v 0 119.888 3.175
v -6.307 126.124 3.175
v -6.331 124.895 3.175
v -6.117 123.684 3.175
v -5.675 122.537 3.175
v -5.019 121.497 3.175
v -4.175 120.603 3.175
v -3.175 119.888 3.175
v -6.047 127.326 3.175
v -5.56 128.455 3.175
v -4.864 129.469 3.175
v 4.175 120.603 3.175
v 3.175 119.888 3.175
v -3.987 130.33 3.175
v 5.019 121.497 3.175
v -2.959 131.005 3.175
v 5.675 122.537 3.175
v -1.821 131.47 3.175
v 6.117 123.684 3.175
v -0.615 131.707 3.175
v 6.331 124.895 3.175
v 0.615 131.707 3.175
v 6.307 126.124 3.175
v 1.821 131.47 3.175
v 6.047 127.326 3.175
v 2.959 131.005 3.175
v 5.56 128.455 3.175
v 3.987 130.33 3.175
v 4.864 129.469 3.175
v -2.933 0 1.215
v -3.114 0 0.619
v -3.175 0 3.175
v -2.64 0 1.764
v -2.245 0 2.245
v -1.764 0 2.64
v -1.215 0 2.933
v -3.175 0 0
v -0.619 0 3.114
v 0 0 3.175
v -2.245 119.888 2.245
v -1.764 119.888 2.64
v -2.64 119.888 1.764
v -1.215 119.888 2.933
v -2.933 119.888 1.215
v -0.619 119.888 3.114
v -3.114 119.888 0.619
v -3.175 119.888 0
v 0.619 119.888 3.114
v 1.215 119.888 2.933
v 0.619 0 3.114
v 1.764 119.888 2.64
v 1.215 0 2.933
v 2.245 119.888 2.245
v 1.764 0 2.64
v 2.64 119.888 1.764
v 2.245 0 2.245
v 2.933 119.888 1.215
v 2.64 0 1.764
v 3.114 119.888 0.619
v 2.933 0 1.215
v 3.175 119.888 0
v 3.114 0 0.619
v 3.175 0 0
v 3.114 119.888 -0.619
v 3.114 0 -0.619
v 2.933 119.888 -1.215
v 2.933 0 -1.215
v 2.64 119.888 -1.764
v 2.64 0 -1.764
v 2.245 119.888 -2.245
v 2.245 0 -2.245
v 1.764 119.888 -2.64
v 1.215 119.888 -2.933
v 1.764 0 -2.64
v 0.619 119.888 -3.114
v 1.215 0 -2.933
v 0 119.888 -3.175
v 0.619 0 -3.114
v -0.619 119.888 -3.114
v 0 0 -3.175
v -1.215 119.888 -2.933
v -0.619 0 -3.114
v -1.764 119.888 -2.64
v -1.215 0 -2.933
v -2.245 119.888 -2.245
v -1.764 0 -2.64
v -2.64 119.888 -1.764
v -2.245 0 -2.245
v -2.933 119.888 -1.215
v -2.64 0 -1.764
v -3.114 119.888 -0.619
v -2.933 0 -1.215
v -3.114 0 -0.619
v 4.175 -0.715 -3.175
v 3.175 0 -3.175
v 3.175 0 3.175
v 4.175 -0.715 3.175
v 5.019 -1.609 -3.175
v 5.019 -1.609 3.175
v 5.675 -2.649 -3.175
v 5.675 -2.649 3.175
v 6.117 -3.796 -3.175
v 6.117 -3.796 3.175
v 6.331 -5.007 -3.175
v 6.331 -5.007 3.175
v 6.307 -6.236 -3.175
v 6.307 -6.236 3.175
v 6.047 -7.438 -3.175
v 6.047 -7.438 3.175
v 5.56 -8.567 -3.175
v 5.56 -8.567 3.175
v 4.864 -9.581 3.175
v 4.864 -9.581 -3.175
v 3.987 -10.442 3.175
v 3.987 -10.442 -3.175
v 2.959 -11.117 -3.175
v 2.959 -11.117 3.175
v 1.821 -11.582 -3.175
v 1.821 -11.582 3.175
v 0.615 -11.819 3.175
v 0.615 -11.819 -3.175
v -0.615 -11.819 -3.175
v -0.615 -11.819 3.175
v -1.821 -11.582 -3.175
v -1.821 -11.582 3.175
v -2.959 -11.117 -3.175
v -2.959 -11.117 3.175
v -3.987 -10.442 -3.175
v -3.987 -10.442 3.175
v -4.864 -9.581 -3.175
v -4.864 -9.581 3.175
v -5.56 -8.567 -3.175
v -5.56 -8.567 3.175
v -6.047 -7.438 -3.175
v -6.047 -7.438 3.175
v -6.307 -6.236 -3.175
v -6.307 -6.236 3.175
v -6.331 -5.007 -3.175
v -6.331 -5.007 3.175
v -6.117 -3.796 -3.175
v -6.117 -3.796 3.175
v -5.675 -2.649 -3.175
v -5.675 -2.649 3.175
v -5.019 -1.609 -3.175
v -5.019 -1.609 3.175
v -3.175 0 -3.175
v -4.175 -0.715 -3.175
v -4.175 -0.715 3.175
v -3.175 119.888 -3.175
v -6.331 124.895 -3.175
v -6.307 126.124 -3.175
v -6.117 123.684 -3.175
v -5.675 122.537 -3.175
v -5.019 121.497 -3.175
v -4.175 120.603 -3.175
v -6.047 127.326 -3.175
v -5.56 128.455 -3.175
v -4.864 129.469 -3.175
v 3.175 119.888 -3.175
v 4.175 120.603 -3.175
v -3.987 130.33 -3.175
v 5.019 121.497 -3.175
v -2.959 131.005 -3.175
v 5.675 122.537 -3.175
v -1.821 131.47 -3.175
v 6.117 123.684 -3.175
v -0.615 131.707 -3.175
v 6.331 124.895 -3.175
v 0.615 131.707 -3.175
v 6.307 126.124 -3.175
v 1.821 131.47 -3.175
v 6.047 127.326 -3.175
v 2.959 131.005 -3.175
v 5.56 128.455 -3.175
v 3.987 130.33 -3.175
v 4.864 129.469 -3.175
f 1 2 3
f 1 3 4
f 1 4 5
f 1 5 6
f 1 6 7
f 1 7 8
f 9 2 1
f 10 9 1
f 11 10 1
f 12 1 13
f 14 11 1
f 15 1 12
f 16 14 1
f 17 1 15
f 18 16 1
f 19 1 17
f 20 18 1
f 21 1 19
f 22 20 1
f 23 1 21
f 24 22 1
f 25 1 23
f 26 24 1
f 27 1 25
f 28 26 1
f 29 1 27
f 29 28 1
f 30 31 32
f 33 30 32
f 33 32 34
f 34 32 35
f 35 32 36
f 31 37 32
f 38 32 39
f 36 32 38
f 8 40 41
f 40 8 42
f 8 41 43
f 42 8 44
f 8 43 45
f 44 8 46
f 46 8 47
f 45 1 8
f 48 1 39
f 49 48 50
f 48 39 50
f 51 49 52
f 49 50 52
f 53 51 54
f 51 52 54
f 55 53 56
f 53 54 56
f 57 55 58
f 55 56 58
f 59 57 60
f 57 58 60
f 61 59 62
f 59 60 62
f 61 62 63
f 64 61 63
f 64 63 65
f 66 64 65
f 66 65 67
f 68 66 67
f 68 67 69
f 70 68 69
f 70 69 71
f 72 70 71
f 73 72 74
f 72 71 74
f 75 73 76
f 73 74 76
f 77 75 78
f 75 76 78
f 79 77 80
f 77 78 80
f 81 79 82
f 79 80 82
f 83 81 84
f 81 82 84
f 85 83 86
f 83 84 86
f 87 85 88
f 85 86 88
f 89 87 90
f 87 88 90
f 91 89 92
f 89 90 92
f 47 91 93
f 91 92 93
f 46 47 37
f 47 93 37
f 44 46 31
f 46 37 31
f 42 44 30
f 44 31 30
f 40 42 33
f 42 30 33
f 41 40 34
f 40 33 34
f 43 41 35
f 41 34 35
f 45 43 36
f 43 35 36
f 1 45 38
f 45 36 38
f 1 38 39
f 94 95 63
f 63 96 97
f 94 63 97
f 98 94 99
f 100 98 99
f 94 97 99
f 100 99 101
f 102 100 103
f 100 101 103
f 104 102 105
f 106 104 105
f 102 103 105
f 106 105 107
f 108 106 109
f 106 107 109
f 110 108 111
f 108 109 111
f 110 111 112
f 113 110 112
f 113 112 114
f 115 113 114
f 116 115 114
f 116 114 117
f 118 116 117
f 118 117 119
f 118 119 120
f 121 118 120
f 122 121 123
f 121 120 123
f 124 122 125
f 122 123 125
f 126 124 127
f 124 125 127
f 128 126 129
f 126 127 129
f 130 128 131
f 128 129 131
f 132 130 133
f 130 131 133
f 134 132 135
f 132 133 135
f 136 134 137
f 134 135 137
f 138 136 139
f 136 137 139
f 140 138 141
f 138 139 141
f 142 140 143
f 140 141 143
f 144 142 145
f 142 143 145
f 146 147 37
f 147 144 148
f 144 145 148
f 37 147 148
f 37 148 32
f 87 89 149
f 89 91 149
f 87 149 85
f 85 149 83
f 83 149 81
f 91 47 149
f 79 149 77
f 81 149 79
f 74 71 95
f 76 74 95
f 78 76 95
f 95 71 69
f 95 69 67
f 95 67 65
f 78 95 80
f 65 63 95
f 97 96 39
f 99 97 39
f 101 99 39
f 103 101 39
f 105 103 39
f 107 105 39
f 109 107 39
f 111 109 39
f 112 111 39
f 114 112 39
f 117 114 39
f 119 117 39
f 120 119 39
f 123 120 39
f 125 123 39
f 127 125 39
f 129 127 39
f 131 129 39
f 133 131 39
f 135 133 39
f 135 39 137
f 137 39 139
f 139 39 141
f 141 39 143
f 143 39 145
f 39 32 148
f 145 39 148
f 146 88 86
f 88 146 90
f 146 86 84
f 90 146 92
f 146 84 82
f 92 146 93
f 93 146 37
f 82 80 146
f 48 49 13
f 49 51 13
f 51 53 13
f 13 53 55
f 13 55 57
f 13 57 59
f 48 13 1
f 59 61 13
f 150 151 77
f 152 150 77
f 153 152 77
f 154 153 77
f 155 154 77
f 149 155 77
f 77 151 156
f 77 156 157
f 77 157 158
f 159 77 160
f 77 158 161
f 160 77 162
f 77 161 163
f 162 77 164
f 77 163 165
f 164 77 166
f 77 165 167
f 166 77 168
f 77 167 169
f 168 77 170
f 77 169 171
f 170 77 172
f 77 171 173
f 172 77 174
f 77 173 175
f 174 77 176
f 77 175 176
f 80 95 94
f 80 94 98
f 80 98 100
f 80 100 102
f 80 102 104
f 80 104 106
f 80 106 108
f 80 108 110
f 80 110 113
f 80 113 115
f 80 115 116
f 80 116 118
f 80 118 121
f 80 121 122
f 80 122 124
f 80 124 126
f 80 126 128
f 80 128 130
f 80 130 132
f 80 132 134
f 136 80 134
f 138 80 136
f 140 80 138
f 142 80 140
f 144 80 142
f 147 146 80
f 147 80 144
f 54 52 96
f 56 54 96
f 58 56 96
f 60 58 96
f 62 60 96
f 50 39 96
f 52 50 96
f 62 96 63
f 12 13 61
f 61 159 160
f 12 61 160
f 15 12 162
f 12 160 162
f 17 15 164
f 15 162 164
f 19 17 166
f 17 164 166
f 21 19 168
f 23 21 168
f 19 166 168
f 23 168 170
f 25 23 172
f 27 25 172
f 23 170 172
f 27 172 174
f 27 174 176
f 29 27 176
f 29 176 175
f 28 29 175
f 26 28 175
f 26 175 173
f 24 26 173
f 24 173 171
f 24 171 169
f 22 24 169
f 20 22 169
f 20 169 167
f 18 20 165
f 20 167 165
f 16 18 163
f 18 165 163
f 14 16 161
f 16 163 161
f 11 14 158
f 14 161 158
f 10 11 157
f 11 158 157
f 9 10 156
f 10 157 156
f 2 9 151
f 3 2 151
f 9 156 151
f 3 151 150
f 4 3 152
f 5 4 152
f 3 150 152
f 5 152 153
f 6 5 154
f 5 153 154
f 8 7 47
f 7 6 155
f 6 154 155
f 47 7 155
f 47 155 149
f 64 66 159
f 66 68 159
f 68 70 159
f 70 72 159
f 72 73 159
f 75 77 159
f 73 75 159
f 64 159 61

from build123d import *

# Parameters (mm, degrees)
SKETCH1_R         = 3.175
CENTER_ROD_DEPTH  = 119.888
CIRCLE_ENDS_DEPTH = 3.175


with BuildPart() as part:
    # Sketch1 → center rod (new body)
    with BuildSketch(Plane(origin=(0, 0, 0), x_dir=(1, 0, 0), z_dir=(0, 1, 0))):
        with Locations(Location((0, 0, 0), (0, 0, 270))):
            Circle(SKETCH1_R)
    extrude(amount=CENTER_ROD_DEPTH)

    # Sketch2 → circle ends (add, symmetric)
    with BuildSketch(Plane.XY):
        with BuildLine():
            Line((-3.175, 119.888), (3.175, 119.888))
            ThreePointArc((3.175, 119.888), (0, 131.737261314), (-3.175, 119.888))
        make_face()
        with BuildLine():
            Line((-3.175, 0), (3.175, 0))
            ThreePointArc((3.175, 0), (0, -11.849261314), (-3.175, 0))
        make_face()
    extrude(amount=CIRCLE_ENDS_DEPTH, both=True)


solid = part.part
